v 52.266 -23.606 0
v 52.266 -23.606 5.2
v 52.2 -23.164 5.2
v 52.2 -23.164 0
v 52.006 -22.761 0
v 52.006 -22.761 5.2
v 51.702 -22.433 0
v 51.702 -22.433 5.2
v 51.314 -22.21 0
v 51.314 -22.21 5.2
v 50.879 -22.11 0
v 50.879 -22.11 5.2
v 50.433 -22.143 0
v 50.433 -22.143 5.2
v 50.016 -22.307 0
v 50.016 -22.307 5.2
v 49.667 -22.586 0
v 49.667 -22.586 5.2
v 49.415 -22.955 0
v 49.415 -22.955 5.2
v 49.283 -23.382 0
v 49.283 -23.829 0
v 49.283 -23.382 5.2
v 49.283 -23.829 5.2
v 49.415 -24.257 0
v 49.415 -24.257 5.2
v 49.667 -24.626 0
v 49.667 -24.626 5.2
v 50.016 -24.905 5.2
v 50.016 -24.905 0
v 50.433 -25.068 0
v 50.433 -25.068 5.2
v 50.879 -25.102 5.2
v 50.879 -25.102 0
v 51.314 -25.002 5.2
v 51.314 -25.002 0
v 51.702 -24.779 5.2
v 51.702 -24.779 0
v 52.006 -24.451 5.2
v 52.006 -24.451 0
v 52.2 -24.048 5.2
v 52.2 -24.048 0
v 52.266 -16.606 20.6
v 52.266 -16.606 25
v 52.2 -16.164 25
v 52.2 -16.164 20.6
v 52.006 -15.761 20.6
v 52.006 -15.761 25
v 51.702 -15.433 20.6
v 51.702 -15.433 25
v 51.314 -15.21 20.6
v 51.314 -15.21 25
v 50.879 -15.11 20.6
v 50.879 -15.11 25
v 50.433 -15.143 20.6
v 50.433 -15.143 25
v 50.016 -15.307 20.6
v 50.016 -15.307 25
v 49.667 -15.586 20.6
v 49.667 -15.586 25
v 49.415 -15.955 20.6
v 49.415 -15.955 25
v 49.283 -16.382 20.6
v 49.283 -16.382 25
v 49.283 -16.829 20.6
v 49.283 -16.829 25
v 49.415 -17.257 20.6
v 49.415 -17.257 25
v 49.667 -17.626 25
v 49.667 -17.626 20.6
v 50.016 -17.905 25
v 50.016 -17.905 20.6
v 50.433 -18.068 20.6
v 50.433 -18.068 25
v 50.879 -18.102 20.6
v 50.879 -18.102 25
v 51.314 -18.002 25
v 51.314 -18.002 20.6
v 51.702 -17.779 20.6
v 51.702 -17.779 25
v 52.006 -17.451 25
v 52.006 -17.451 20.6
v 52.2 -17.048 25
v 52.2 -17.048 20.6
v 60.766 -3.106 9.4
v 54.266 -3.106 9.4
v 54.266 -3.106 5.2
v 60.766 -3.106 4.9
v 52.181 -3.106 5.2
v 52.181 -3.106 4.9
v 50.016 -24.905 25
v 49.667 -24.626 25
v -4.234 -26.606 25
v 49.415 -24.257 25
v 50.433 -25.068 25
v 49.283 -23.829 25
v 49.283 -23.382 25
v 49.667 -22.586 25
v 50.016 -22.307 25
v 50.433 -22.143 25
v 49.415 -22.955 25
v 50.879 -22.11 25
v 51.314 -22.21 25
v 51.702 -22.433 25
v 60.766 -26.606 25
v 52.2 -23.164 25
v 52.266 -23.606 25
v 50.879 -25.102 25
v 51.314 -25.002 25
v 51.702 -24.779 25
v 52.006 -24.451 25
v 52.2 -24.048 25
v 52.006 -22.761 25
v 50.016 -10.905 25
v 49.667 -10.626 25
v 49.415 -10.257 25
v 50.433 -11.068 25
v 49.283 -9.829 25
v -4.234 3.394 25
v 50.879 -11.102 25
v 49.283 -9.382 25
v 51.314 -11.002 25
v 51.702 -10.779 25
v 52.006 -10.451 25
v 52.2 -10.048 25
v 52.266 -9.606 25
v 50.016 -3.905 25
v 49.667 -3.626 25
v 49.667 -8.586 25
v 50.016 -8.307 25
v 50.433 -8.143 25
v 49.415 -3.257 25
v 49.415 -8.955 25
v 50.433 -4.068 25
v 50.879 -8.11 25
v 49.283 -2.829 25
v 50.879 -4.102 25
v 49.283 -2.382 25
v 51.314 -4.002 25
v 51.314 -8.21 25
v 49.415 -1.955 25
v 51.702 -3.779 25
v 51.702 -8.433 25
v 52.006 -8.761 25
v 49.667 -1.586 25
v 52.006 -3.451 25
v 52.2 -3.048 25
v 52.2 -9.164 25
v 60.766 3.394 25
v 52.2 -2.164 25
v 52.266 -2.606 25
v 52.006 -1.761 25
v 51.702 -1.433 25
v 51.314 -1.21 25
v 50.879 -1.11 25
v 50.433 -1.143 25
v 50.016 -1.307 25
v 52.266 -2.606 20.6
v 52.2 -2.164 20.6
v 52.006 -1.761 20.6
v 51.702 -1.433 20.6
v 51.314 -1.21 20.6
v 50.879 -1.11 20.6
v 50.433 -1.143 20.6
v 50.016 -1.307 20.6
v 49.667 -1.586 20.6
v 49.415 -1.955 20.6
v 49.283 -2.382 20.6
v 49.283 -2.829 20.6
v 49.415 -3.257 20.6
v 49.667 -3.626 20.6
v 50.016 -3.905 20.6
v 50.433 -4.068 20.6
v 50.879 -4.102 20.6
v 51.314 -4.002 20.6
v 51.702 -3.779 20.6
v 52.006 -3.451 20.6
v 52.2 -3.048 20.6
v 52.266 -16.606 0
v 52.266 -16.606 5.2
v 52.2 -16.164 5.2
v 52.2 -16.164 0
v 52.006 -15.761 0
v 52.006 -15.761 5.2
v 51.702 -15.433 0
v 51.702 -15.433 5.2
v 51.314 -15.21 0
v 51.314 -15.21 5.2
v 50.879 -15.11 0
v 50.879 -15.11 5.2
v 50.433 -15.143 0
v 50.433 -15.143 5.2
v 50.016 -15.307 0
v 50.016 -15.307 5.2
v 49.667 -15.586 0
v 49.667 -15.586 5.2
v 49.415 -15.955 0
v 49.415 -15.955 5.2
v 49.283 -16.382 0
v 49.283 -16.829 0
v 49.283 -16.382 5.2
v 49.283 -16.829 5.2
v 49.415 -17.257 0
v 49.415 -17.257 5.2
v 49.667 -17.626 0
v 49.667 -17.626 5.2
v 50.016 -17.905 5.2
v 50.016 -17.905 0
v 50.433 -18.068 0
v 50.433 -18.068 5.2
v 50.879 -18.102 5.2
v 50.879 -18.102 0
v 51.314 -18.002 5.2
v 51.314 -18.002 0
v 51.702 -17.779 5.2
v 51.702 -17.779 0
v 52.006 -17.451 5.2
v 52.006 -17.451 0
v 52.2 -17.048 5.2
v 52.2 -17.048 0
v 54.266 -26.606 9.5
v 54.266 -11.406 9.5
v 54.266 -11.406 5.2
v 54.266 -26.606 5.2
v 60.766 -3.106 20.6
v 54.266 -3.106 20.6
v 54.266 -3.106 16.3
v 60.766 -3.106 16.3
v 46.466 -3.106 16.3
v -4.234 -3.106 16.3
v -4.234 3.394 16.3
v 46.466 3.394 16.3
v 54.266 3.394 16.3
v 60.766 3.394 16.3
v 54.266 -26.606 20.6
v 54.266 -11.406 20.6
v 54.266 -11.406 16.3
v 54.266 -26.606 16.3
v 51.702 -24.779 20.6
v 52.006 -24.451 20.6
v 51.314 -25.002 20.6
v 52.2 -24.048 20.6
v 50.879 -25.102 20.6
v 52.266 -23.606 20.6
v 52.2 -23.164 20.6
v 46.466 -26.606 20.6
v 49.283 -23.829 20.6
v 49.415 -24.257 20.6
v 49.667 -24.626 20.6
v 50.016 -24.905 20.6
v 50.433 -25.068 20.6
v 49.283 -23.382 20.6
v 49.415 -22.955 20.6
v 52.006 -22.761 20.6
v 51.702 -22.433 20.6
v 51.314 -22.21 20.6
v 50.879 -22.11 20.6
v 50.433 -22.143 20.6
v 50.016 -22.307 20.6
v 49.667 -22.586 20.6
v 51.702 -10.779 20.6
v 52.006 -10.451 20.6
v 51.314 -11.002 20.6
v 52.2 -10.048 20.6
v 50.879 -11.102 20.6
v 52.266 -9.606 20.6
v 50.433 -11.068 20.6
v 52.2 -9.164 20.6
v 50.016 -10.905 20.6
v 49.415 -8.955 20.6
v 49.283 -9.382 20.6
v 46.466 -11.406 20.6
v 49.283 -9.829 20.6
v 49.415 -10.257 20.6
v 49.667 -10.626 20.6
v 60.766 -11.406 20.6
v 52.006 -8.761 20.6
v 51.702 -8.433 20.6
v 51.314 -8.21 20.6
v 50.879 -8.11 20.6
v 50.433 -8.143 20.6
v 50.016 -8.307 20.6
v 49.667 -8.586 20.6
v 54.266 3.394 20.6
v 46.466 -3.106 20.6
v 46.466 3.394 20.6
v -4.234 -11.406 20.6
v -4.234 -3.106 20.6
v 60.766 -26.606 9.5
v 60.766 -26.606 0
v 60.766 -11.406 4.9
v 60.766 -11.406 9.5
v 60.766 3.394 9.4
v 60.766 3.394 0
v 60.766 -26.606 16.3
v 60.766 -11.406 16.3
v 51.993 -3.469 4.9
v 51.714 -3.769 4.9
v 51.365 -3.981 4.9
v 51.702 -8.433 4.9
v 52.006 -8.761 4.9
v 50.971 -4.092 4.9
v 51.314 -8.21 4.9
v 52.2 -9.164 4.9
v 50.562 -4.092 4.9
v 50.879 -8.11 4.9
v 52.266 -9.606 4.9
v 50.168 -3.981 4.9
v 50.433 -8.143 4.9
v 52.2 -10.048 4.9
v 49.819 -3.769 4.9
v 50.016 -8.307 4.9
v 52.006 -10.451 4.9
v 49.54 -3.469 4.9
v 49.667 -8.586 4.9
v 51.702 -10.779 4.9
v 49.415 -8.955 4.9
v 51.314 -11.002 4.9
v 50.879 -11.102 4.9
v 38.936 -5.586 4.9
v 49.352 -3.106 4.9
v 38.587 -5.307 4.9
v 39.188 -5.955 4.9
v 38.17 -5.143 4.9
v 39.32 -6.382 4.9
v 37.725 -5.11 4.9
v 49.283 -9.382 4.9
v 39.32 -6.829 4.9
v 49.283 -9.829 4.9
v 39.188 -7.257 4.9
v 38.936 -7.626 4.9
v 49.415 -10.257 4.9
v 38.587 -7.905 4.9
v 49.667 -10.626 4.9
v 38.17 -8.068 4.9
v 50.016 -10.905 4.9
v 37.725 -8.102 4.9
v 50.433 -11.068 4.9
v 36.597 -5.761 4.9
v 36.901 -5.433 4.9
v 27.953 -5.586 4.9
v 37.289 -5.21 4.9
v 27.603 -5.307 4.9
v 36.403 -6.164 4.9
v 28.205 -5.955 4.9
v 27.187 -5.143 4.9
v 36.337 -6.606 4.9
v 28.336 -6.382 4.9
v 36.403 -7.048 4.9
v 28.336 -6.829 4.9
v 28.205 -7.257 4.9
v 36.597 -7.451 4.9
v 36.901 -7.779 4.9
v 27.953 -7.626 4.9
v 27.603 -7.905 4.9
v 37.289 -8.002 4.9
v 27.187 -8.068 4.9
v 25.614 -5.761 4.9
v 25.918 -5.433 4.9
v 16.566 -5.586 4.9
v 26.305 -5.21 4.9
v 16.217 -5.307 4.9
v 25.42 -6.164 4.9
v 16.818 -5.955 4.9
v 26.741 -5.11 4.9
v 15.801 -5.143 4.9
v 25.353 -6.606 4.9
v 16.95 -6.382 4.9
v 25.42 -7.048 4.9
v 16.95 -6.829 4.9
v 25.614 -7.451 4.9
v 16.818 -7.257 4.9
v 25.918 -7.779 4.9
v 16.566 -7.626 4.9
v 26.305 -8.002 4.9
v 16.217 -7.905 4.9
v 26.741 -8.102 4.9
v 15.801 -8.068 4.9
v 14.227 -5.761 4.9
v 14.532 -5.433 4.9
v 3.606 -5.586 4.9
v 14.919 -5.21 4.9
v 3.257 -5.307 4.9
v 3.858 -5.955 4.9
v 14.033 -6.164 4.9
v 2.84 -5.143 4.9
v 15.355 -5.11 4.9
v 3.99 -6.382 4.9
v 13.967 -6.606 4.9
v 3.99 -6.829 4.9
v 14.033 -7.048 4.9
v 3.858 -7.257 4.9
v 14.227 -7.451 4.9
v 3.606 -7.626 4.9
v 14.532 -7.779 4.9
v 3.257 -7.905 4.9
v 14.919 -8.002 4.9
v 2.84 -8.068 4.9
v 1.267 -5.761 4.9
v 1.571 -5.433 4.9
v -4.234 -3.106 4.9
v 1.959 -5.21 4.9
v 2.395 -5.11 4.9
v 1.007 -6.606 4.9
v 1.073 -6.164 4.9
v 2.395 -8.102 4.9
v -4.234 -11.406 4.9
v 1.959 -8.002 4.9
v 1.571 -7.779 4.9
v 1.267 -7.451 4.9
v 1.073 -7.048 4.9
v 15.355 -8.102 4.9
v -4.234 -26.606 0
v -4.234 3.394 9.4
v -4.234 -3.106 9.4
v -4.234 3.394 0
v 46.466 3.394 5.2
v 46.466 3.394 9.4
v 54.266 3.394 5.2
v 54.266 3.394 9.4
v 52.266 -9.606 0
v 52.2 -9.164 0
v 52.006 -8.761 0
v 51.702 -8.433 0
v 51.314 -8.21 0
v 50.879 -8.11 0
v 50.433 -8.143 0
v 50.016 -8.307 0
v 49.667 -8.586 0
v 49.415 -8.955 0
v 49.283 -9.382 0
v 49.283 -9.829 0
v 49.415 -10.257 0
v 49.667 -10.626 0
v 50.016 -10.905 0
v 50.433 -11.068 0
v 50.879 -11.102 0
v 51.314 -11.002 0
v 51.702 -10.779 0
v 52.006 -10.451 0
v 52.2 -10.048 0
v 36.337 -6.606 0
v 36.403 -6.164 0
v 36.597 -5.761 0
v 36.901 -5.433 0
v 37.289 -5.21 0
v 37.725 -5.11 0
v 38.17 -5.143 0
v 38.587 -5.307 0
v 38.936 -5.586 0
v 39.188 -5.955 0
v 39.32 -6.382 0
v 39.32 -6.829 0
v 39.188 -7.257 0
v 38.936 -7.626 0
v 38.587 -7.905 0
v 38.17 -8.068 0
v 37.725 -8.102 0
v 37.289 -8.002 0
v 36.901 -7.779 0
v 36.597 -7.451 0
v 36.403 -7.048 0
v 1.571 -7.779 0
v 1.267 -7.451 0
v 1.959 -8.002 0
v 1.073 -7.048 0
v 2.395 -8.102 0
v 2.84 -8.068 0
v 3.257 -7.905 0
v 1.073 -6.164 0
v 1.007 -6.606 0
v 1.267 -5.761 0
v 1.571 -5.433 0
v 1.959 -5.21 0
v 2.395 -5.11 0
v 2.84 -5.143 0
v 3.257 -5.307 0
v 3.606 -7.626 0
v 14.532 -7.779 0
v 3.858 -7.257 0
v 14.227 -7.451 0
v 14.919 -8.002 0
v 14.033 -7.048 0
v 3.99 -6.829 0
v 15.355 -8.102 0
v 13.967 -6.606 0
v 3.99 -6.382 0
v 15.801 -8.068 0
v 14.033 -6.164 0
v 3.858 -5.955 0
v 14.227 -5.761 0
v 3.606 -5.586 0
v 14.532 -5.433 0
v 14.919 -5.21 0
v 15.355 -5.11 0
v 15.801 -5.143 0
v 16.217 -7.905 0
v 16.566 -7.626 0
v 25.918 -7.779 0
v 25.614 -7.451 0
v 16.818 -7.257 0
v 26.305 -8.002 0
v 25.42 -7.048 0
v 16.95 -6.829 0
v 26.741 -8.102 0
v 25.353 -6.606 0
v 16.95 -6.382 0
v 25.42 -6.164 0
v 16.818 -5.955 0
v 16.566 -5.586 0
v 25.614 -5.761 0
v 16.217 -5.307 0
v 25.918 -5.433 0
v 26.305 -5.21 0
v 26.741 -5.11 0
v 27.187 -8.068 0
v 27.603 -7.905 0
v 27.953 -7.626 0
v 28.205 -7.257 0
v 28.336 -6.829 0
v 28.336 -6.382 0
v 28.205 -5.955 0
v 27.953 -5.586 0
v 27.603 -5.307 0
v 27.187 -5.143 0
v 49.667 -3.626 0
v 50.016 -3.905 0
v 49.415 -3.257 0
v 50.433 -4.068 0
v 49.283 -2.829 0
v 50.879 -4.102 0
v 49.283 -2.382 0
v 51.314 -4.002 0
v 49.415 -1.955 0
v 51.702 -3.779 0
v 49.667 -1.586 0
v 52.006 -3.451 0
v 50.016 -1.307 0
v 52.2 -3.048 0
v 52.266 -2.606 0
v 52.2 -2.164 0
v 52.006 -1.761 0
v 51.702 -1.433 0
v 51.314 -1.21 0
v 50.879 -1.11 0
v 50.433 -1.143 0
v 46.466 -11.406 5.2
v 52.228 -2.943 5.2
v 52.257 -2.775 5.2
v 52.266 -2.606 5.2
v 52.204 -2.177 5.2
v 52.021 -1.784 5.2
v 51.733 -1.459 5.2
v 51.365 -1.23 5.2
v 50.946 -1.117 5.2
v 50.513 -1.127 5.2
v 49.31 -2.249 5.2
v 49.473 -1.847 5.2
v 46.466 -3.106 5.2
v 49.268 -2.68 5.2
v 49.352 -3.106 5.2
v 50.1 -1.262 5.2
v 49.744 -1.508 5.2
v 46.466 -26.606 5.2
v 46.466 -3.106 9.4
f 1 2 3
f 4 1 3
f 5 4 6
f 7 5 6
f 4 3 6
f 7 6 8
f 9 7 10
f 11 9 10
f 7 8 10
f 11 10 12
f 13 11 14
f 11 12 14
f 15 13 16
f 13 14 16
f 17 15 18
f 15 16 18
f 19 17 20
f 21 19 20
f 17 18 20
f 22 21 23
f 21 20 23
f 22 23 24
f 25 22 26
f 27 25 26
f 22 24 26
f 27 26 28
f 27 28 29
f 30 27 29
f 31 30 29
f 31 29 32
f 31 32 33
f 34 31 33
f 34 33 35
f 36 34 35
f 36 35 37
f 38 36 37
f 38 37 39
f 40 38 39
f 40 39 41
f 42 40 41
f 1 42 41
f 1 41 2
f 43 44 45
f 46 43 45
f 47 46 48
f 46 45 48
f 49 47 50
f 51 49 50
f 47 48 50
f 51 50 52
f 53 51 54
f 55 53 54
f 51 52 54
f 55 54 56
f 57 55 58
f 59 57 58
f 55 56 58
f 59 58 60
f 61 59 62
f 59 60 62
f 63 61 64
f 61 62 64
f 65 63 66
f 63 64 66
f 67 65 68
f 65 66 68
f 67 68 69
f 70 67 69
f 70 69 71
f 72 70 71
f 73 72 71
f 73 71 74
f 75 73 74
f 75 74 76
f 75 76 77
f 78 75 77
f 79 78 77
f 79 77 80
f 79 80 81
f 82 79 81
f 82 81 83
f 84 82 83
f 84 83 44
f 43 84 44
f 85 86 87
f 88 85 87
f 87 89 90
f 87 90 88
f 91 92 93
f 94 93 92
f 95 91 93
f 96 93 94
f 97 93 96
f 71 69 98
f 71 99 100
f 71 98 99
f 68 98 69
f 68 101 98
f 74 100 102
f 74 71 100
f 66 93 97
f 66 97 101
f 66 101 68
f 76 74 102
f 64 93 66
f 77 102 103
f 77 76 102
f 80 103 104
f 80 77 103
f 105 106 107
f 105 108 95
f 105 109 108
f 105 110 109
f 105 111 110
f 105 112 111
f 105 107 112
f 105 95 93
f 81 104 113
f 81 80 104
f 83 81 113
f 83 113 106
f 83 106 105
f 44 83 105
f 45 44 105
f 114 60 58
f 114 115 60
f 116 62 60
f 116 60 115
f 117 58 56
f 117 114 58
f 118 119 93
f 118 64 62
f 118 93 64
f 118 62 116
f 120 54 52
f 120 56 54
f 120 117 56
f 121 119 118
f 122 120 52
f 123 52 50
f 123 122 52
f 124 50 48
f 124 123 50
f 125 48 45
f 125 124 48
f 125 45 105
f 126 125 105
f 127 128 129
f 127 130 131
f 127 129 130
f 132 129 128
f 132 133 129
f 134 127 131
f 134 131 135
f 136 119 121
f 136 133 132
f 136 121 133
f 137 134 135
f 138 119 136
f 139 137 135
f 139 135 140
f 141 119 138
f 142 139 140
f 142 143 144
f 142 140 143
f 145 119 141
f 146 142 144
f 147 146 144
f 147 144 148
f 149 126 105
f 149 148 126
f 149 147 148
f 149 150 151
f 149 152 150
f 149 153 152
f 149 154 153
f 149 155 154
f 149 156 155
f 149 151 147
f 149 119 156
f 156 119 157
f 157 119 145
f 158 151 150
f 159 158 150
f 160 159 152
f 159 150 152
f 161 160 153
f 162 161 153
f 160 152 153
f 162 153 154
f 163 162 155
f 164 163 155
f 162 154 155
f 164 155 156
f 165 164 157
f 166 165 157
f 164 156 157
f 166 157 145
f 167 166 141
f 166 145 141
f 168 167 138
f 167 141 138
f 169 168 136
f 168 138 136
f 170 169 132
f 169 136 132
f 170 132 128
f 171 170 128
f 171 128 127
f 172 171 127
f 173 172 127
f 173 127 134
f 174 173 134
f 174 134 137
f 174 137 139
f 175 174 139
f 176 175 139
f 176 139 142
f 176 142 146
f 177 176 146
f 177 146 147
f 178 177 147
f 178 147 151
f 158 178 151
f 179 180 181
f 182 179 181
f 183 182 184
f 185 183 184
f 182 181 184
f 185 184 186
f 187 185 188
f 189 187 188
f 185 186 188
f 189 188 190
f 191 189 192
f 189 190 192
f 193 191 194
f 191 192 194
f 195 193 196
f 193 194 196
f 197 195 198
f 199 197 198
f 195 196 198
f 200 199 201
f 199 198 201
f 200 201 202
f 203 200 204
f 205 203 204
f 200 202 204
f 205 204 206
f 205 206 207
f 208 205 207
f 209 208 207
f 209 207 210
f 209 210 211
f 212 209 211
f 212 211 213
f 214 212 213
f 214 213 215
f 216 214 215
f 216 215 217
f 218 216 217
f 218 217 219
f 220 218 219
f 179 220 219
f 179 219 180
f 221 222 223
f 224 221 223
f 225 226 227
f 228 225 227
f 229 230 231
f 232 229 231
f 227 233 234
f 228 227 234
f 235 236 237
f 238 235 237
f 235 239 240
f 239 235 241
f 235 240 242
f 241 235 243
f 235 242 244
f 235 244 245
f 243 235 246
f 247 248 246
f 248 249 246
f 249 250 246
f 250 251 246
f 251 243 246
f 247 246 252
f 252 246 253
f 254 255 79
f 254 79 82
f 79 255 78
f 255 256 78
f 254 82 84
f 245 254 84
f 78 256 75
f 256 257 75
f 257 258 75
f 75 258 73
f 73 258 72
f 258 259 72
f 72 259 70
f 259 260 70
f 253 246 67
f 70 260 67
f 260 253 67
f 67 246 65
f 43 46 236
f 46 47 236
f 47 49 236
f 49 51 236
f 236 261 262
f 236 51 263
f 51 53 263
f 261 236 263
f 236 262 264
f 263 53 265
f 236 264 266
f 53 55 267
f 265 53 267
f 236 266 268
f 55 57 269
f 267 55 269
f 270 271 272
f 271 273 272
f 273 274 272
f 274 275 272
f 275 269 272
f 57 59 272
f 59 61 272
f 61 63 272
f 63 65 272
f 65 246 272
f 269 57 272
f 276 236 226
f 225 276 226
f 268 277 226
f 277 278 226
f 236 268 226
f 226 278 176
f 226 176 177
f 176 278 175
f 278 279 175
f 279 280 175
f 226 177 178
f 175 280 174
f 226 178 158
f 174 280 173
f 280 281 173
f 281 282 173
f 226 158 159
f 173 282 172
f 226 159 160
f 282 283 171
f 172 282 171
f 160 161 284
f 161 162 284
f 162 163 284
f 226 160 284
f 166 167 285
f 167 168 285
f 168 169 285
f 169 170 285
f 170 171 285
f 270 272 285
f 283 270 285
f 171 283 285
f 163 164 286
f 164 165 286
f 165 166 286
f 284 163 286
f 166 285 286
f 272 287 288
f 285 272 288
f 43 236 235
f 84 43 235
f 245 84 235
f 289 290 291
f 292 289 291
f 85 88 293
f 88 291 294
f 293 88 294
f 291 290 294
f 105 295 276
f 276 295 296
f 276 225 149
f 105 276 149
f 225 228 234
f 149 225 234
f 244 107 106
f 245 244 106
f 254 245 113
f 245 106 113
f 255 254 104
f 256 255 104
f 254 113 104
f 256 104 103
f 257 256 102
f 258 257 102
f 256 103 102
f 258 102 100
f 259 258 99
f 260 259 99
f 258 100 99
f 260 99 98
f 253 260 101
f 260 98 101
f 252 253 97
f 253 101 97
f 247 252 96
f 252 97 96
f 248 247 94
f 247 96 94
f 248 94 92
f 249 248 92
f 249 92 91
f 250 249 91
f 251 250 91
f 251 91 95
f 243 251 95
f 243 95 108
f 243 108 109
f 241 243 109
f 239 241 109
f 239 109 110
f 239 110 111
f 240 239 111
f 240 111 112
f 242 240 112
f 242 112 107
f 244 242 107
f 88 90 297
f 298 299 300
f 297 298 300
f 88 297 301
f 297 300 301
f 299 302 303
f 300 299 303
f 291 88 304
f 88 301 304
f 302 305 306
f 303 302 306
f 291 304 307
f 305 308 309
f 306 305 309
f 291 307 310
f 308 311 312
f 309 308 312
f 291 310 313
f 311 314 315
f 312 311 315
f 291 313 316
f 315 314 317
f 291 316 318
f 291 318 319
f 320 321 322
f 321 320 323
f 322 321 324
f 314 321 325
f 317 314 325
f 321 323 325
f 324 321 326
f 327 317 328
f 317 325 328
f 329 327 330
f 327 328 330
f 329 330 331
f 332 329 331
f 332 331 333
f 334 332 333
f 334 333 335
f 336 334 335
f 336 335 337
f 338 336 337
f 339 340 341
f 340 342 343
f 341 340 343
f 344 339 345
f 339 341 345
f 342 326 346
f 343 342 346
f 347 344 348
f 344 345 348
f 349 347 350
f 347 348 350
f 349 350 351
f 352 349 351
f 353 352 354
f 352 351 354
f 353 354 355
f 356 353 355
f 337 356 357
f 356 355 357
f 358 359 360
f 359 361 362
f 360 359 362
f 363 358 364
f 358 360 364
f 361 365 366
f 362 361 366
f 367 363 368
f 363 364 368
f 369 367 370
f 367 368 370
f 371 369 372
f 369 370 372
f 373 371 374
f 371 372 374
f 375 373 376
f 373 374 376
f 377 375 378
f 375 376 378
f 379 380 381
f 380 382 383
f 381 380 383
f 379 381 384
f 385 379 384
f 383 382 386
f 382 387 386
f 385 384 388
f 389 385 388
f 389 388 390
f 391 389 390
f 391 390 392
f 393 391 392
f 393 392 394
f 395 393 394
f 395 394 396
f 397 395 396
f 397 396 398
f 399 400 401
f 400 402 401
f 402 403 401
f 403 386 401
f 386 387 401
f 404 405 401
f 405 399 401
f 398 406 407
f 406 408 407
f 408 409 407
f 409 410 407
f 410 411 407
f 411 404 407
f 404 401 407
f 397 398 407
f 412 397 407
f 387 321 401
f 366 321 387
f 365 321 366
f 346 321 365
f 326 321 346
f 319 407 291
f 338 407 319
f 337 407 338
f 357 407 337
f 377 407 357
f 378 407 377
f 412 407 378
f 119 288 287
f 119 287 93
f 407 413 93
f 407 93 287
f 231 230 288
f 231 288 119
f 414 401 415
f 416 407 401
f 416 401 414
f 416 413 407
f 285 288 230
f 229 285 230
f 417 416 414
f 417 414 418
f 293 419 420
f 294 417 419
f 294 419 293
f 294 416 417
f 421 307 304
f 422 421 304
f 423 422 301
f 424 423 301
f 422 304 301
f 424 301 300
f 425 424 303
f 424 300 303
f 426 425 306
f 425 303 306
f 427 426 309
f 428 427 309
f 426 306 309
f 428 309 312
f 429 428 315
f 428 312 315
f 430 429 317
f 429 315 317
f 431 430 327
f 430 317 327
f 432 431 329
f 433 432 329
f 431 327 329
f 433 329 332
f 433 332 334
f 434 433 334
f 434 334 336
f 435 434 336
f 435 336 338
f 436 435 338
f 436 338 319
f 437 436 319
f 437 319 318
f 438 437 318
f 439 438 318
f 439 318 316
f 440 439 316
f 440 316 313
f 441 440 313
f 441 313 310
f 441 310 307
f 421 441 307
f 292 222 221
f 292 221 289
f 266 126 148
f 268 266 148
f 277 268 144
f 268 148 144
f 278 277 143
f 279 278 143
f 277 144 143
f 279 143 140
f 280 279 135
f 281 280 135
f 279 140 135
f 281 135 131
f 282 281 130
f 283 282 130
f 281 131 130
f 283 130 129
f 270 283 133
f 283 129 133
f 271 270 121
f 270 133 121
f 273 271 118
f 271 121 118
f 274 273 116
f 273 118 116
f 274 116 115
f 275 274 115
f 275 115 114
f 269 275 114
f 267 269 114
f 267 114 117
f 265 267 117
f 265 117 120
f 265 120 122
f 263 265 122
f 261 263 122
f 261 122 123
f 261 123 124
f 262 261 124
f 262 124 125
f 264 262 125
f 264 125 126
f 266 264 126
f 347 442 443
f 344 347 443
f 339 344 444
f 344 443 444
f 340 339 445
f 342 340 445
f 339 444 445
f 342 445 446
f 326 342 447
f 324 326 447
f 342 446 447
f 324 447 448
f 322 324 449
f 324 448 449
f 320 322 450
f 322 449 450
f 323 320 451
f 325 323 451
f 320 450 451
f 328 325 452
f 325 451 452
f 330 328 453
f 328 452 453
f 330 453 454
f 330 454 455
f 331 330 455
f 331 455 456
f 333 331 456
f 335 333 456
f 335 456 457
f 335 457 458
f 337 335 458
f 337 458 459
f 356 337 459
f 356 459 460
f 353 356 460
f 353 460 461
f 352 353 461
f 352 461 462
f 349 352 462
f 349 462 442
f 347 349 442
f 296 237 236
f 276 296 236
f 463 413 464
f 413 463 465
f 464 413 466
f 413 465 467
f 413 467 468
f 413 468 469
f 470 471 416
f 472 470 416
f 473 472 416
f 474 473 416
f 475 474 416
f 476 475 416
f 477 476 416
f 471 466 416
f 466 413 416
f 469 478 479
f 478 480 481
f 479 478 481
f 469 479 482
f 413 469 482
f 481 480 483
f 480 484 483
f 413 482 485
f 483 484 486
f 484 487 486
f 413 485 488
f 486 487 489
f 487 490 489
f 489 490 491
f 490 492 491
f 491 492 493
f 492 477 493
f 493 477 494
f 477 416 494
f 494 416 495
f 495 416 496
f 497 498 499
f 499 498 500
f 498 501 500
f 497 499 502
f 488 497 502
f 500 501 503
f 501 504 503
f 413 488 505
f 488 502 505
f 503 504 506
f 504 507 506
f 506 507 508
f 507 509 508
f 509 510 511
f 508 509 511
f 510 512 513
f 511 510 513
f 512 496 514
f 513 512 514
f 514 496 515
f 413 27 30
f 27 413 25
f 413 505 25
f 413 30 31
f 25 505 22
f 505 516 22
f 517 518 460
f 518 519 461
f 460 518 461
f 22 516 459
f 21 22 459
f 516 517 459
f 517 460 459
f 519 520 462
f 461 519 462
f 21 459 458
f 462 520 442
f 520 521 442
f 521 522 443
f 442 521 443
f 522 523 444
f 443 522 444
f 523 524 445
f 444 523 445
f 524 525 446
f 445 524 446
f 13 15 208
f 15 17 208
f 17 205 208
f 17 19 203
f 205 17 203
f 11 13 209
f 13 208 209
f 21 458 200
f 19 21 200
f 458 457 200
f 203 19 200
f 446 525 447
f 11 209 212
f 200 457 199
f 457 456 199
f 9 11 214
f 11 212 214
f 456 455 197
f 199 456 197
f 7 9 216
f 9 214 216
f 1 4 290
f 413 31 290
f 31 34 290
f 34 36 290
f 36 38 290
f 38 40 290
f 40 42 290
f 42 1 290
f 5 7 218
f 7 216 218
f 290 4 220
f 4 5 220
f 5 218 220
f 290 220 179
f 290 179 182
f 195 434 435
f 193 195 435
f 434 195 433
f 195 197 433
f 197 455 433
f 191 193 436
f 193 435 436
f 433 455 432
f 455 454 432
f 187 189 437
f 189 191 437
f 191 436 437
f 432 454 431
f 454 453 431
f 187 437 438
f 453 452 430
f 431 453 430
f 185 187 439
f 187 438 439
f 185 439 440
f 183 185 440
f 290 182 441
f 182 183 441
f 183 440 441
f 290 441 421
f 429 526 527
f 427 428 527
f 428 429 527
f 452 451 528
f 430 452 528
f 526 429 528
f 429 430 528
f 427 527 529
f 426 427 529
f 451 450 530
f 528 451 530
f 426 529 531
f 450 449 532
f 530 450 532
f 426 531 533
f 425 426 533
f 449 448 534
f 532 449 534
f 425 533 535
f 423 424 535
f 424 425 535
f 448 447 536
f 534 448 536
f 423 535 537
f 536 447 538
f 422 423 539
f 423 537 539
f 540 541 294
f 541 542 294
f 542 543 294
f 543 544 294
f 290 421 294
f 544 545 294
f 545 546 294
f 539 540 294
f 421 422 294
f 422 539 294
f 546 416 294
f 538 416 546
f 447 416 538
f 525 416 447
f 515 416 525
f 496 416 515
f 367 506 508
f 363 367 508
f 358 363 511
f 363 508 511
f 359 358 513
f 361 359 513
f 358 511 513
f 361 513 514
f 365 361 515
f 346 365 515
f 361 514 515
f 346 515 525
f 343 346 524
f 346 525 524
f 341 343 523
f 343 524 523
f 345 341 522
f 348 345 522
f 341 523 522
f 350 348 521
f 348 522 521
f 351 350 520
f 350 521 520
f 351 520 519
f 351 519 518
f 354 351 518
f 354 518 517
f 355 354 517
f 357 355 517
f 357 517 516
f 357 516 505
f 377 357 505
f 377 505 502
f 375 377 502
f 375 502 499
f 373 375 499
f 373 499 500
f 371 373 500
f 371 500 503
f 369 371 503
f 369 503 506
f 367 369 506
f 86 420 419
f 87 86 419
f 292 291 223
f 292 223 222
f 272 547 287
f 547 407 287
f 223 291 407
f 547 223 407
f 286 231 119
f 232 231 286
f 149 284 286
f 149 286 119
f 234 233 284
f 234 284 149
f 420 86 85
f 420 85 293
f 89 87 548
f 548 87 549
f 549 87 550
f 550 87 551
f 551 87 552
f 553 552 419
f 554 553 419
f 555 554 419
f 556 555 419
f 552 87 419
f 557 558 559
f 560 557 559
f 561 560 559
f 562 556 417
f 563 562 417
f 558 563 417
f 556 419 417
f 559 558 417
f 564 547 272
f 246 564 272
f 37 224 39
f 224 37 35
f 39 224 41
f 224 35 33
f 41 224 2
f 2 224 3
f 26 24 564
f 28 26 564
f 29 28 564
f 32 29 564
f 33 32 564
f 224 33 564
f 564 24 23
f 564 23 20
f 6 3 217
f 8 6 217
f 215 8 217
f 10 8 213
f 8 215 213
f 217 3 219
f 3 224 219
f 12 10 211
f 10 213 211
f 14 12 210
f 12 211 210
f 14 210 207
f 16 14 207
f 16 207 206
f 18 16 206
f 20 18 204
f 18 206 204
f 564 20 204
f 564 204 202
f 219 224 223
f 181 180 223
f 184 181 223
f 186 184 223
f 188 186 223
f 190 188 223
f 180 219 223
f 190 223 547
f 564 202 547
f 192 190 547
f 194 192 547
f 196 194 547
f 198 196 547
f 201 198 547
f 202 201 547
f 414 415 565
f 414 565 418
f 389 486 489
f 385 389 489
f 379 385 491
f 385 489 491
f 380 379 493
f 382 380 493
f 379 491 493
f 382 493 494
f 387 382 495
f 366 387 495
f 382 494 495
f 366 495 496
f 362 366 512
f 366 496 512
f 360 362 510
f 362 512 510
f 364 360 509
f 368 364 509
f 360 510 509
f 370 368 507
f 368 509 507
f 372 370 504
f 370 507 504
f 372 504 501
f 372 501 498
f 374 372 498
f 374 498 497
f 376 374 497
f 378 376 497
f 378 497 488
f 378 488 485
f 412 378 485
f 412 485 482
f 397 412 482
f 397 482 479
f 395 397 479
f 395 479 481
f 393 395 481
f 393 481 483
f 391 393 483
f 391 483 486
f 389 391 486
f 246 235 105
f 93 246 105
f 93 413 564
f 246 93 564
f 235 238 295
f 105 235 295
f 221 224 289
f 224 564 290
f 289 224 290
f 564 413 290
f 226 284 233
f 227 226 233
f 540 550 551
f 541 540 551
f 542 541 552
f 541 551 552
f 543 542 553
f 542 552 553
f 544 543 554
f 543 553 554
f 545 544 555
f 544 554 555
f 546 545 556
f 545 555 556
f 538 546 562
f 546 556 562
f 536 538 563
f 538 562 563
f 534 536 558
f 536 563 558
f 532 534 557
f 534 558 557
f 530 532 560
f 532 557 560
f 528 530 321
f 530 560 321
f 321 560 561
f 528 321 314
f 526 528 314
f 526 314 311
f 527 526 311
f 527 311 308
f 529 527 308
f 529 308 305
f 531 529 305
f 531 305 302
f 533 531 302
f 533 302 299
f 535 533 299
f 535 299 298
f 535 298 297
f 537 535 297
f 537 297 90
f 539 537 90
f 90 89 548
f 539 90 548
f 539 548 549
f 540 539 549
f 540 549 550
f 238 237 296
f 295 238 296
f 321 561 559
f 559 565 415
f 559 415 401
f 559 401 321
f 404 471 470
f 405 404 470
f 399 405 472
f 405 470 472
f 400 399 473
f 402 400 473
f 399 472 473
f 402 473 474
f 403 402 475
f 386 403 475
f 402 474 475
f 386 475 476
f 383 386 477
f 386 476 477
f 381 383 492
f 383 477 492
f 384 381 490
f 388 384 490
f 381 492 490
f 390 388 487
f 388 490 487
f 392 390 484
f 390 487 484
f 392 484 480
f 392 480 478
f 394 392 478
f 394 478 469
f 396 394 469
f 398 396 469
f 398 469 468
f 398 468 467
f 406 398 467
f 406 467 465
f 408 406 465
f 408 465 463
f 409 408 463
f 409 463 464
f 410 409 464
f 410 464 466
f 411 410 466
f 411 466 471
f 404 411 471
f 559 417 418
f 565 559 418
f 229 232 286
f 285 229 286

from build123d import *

# Parameters (mm, degrees)
SKETCH1_W           = 65
SKETCH1_H           = 30
BOSS_EXTRUDE1_DEPTH = 25
SKETCH2_W           = 6.5
SKETCH2_H           = 6.8
CUT_EXTRUDE1_DEPTH  = 31
SKETCH5_R           = 1.5
CUT_EXTRUDE3_DEPTH  = 26
SKETCH6_W           = 6.9
SKETCH6_H           = 6.5
CUT_EXTRUDE4_DEPTH  = 66
SKETCH7_R           = 1.5
CUT_EXTRUDE5_DEPTH  = 10


with BuildPart() as part:
    # Sketch1 → Boss-Extrude1 (new body)
    with BuildSketch(Plane.XY):
        with Locations((28.266423358, -11.605839416)):
            Rectangle(SKETCH1_W, SKETCH1_H)
    extrude(amount=BOSS_EXTRUDE1_DEPTH)

    # Sketch2 → Cut-Extrude1 (cut, through all)
    with BuildSketch(Plane(origin=(0, 3.394160584, 0), x_dir=(1, 0, 0), z_dir=(0, 1, 0))):
        with Locations((57.516423358, -12.9)):
            Rectangle(SKETCH2_W, SKETCH2_H)
        Polygon((54.266423358, -20.6), (54.266423358, -16.3), (54.266423358, -9.5), (54.266423358, -5.2), (46.466423358, -5.2), (46.466423358, -20.6), align=None)
    extrude(amount=-CUT_EXTRUDE1_DEPTH, mode=Mode.SUBTRACT)

    # Sketch5 → Cut-Extrude3 (cut, through all)
    with BuildSketch(Plane.XY.offset(25)):
        with Locations((50.766423358, -2.605839416)):
            Circle(SKETCH5_R)
        with Locations((50.766423358, -9.605839416)):
            Circle(SKETCH5_R)
        with Locations((50.766423358, -16.605839416)):
            Circle(SKETCH5_R)
        with Locations((50.766423358, -23.605839416)):
            Circle(SKETCH5_R)
    extrude(amount=-CUT_EXTRUDE3_DEPTH, mode=Mode.SUBTRACT)

    # Sketch6 → Cut-Extrude4 (cut, through all)
    with BuildSketch(Plane.ZY.offset(4.233576642)):
        Polygon((16.3, -3.105839416), (9.4, -3.105839416), (4.9, -3.105839416), (4.9, -11.405839416), (20.6, -11.405839416), (20.6, -3.105839416), align=None)
        with Locations((12.85, 0.144160584)):
            Rectangle(SKETCH6_W, SKETCH6_H)
    extrude(amount=-CUT_EXTRUDE4_DEPTH, mode=Mode.SUBTRACT)

    # Sketch7 → Cut-Extrude5 (cut)
    with BuildSketch(Plane(origin=(0, 0, 0), x_dir=(-1, 0, 0), z_dir=(0, 0, -1))):
        with Locations((-2.506646914, -6.605839416)):
            Circle(SKETCH7_R)
        with Locations((-15.4668355, -6.605839416)):
            Circle(SKETCH7_R)
        with Locations((-26.853051517, -6.605839416)):
            Circle(SKETCH7_R)
        with Locations((-37.836637843, -6.605839416)):
            Circle(SKETCH7_R)
    extrude(amount=-CUT_EXTRUDE5_DEPTH, mode=Mode.SUBTRACT)


solid = part.part
